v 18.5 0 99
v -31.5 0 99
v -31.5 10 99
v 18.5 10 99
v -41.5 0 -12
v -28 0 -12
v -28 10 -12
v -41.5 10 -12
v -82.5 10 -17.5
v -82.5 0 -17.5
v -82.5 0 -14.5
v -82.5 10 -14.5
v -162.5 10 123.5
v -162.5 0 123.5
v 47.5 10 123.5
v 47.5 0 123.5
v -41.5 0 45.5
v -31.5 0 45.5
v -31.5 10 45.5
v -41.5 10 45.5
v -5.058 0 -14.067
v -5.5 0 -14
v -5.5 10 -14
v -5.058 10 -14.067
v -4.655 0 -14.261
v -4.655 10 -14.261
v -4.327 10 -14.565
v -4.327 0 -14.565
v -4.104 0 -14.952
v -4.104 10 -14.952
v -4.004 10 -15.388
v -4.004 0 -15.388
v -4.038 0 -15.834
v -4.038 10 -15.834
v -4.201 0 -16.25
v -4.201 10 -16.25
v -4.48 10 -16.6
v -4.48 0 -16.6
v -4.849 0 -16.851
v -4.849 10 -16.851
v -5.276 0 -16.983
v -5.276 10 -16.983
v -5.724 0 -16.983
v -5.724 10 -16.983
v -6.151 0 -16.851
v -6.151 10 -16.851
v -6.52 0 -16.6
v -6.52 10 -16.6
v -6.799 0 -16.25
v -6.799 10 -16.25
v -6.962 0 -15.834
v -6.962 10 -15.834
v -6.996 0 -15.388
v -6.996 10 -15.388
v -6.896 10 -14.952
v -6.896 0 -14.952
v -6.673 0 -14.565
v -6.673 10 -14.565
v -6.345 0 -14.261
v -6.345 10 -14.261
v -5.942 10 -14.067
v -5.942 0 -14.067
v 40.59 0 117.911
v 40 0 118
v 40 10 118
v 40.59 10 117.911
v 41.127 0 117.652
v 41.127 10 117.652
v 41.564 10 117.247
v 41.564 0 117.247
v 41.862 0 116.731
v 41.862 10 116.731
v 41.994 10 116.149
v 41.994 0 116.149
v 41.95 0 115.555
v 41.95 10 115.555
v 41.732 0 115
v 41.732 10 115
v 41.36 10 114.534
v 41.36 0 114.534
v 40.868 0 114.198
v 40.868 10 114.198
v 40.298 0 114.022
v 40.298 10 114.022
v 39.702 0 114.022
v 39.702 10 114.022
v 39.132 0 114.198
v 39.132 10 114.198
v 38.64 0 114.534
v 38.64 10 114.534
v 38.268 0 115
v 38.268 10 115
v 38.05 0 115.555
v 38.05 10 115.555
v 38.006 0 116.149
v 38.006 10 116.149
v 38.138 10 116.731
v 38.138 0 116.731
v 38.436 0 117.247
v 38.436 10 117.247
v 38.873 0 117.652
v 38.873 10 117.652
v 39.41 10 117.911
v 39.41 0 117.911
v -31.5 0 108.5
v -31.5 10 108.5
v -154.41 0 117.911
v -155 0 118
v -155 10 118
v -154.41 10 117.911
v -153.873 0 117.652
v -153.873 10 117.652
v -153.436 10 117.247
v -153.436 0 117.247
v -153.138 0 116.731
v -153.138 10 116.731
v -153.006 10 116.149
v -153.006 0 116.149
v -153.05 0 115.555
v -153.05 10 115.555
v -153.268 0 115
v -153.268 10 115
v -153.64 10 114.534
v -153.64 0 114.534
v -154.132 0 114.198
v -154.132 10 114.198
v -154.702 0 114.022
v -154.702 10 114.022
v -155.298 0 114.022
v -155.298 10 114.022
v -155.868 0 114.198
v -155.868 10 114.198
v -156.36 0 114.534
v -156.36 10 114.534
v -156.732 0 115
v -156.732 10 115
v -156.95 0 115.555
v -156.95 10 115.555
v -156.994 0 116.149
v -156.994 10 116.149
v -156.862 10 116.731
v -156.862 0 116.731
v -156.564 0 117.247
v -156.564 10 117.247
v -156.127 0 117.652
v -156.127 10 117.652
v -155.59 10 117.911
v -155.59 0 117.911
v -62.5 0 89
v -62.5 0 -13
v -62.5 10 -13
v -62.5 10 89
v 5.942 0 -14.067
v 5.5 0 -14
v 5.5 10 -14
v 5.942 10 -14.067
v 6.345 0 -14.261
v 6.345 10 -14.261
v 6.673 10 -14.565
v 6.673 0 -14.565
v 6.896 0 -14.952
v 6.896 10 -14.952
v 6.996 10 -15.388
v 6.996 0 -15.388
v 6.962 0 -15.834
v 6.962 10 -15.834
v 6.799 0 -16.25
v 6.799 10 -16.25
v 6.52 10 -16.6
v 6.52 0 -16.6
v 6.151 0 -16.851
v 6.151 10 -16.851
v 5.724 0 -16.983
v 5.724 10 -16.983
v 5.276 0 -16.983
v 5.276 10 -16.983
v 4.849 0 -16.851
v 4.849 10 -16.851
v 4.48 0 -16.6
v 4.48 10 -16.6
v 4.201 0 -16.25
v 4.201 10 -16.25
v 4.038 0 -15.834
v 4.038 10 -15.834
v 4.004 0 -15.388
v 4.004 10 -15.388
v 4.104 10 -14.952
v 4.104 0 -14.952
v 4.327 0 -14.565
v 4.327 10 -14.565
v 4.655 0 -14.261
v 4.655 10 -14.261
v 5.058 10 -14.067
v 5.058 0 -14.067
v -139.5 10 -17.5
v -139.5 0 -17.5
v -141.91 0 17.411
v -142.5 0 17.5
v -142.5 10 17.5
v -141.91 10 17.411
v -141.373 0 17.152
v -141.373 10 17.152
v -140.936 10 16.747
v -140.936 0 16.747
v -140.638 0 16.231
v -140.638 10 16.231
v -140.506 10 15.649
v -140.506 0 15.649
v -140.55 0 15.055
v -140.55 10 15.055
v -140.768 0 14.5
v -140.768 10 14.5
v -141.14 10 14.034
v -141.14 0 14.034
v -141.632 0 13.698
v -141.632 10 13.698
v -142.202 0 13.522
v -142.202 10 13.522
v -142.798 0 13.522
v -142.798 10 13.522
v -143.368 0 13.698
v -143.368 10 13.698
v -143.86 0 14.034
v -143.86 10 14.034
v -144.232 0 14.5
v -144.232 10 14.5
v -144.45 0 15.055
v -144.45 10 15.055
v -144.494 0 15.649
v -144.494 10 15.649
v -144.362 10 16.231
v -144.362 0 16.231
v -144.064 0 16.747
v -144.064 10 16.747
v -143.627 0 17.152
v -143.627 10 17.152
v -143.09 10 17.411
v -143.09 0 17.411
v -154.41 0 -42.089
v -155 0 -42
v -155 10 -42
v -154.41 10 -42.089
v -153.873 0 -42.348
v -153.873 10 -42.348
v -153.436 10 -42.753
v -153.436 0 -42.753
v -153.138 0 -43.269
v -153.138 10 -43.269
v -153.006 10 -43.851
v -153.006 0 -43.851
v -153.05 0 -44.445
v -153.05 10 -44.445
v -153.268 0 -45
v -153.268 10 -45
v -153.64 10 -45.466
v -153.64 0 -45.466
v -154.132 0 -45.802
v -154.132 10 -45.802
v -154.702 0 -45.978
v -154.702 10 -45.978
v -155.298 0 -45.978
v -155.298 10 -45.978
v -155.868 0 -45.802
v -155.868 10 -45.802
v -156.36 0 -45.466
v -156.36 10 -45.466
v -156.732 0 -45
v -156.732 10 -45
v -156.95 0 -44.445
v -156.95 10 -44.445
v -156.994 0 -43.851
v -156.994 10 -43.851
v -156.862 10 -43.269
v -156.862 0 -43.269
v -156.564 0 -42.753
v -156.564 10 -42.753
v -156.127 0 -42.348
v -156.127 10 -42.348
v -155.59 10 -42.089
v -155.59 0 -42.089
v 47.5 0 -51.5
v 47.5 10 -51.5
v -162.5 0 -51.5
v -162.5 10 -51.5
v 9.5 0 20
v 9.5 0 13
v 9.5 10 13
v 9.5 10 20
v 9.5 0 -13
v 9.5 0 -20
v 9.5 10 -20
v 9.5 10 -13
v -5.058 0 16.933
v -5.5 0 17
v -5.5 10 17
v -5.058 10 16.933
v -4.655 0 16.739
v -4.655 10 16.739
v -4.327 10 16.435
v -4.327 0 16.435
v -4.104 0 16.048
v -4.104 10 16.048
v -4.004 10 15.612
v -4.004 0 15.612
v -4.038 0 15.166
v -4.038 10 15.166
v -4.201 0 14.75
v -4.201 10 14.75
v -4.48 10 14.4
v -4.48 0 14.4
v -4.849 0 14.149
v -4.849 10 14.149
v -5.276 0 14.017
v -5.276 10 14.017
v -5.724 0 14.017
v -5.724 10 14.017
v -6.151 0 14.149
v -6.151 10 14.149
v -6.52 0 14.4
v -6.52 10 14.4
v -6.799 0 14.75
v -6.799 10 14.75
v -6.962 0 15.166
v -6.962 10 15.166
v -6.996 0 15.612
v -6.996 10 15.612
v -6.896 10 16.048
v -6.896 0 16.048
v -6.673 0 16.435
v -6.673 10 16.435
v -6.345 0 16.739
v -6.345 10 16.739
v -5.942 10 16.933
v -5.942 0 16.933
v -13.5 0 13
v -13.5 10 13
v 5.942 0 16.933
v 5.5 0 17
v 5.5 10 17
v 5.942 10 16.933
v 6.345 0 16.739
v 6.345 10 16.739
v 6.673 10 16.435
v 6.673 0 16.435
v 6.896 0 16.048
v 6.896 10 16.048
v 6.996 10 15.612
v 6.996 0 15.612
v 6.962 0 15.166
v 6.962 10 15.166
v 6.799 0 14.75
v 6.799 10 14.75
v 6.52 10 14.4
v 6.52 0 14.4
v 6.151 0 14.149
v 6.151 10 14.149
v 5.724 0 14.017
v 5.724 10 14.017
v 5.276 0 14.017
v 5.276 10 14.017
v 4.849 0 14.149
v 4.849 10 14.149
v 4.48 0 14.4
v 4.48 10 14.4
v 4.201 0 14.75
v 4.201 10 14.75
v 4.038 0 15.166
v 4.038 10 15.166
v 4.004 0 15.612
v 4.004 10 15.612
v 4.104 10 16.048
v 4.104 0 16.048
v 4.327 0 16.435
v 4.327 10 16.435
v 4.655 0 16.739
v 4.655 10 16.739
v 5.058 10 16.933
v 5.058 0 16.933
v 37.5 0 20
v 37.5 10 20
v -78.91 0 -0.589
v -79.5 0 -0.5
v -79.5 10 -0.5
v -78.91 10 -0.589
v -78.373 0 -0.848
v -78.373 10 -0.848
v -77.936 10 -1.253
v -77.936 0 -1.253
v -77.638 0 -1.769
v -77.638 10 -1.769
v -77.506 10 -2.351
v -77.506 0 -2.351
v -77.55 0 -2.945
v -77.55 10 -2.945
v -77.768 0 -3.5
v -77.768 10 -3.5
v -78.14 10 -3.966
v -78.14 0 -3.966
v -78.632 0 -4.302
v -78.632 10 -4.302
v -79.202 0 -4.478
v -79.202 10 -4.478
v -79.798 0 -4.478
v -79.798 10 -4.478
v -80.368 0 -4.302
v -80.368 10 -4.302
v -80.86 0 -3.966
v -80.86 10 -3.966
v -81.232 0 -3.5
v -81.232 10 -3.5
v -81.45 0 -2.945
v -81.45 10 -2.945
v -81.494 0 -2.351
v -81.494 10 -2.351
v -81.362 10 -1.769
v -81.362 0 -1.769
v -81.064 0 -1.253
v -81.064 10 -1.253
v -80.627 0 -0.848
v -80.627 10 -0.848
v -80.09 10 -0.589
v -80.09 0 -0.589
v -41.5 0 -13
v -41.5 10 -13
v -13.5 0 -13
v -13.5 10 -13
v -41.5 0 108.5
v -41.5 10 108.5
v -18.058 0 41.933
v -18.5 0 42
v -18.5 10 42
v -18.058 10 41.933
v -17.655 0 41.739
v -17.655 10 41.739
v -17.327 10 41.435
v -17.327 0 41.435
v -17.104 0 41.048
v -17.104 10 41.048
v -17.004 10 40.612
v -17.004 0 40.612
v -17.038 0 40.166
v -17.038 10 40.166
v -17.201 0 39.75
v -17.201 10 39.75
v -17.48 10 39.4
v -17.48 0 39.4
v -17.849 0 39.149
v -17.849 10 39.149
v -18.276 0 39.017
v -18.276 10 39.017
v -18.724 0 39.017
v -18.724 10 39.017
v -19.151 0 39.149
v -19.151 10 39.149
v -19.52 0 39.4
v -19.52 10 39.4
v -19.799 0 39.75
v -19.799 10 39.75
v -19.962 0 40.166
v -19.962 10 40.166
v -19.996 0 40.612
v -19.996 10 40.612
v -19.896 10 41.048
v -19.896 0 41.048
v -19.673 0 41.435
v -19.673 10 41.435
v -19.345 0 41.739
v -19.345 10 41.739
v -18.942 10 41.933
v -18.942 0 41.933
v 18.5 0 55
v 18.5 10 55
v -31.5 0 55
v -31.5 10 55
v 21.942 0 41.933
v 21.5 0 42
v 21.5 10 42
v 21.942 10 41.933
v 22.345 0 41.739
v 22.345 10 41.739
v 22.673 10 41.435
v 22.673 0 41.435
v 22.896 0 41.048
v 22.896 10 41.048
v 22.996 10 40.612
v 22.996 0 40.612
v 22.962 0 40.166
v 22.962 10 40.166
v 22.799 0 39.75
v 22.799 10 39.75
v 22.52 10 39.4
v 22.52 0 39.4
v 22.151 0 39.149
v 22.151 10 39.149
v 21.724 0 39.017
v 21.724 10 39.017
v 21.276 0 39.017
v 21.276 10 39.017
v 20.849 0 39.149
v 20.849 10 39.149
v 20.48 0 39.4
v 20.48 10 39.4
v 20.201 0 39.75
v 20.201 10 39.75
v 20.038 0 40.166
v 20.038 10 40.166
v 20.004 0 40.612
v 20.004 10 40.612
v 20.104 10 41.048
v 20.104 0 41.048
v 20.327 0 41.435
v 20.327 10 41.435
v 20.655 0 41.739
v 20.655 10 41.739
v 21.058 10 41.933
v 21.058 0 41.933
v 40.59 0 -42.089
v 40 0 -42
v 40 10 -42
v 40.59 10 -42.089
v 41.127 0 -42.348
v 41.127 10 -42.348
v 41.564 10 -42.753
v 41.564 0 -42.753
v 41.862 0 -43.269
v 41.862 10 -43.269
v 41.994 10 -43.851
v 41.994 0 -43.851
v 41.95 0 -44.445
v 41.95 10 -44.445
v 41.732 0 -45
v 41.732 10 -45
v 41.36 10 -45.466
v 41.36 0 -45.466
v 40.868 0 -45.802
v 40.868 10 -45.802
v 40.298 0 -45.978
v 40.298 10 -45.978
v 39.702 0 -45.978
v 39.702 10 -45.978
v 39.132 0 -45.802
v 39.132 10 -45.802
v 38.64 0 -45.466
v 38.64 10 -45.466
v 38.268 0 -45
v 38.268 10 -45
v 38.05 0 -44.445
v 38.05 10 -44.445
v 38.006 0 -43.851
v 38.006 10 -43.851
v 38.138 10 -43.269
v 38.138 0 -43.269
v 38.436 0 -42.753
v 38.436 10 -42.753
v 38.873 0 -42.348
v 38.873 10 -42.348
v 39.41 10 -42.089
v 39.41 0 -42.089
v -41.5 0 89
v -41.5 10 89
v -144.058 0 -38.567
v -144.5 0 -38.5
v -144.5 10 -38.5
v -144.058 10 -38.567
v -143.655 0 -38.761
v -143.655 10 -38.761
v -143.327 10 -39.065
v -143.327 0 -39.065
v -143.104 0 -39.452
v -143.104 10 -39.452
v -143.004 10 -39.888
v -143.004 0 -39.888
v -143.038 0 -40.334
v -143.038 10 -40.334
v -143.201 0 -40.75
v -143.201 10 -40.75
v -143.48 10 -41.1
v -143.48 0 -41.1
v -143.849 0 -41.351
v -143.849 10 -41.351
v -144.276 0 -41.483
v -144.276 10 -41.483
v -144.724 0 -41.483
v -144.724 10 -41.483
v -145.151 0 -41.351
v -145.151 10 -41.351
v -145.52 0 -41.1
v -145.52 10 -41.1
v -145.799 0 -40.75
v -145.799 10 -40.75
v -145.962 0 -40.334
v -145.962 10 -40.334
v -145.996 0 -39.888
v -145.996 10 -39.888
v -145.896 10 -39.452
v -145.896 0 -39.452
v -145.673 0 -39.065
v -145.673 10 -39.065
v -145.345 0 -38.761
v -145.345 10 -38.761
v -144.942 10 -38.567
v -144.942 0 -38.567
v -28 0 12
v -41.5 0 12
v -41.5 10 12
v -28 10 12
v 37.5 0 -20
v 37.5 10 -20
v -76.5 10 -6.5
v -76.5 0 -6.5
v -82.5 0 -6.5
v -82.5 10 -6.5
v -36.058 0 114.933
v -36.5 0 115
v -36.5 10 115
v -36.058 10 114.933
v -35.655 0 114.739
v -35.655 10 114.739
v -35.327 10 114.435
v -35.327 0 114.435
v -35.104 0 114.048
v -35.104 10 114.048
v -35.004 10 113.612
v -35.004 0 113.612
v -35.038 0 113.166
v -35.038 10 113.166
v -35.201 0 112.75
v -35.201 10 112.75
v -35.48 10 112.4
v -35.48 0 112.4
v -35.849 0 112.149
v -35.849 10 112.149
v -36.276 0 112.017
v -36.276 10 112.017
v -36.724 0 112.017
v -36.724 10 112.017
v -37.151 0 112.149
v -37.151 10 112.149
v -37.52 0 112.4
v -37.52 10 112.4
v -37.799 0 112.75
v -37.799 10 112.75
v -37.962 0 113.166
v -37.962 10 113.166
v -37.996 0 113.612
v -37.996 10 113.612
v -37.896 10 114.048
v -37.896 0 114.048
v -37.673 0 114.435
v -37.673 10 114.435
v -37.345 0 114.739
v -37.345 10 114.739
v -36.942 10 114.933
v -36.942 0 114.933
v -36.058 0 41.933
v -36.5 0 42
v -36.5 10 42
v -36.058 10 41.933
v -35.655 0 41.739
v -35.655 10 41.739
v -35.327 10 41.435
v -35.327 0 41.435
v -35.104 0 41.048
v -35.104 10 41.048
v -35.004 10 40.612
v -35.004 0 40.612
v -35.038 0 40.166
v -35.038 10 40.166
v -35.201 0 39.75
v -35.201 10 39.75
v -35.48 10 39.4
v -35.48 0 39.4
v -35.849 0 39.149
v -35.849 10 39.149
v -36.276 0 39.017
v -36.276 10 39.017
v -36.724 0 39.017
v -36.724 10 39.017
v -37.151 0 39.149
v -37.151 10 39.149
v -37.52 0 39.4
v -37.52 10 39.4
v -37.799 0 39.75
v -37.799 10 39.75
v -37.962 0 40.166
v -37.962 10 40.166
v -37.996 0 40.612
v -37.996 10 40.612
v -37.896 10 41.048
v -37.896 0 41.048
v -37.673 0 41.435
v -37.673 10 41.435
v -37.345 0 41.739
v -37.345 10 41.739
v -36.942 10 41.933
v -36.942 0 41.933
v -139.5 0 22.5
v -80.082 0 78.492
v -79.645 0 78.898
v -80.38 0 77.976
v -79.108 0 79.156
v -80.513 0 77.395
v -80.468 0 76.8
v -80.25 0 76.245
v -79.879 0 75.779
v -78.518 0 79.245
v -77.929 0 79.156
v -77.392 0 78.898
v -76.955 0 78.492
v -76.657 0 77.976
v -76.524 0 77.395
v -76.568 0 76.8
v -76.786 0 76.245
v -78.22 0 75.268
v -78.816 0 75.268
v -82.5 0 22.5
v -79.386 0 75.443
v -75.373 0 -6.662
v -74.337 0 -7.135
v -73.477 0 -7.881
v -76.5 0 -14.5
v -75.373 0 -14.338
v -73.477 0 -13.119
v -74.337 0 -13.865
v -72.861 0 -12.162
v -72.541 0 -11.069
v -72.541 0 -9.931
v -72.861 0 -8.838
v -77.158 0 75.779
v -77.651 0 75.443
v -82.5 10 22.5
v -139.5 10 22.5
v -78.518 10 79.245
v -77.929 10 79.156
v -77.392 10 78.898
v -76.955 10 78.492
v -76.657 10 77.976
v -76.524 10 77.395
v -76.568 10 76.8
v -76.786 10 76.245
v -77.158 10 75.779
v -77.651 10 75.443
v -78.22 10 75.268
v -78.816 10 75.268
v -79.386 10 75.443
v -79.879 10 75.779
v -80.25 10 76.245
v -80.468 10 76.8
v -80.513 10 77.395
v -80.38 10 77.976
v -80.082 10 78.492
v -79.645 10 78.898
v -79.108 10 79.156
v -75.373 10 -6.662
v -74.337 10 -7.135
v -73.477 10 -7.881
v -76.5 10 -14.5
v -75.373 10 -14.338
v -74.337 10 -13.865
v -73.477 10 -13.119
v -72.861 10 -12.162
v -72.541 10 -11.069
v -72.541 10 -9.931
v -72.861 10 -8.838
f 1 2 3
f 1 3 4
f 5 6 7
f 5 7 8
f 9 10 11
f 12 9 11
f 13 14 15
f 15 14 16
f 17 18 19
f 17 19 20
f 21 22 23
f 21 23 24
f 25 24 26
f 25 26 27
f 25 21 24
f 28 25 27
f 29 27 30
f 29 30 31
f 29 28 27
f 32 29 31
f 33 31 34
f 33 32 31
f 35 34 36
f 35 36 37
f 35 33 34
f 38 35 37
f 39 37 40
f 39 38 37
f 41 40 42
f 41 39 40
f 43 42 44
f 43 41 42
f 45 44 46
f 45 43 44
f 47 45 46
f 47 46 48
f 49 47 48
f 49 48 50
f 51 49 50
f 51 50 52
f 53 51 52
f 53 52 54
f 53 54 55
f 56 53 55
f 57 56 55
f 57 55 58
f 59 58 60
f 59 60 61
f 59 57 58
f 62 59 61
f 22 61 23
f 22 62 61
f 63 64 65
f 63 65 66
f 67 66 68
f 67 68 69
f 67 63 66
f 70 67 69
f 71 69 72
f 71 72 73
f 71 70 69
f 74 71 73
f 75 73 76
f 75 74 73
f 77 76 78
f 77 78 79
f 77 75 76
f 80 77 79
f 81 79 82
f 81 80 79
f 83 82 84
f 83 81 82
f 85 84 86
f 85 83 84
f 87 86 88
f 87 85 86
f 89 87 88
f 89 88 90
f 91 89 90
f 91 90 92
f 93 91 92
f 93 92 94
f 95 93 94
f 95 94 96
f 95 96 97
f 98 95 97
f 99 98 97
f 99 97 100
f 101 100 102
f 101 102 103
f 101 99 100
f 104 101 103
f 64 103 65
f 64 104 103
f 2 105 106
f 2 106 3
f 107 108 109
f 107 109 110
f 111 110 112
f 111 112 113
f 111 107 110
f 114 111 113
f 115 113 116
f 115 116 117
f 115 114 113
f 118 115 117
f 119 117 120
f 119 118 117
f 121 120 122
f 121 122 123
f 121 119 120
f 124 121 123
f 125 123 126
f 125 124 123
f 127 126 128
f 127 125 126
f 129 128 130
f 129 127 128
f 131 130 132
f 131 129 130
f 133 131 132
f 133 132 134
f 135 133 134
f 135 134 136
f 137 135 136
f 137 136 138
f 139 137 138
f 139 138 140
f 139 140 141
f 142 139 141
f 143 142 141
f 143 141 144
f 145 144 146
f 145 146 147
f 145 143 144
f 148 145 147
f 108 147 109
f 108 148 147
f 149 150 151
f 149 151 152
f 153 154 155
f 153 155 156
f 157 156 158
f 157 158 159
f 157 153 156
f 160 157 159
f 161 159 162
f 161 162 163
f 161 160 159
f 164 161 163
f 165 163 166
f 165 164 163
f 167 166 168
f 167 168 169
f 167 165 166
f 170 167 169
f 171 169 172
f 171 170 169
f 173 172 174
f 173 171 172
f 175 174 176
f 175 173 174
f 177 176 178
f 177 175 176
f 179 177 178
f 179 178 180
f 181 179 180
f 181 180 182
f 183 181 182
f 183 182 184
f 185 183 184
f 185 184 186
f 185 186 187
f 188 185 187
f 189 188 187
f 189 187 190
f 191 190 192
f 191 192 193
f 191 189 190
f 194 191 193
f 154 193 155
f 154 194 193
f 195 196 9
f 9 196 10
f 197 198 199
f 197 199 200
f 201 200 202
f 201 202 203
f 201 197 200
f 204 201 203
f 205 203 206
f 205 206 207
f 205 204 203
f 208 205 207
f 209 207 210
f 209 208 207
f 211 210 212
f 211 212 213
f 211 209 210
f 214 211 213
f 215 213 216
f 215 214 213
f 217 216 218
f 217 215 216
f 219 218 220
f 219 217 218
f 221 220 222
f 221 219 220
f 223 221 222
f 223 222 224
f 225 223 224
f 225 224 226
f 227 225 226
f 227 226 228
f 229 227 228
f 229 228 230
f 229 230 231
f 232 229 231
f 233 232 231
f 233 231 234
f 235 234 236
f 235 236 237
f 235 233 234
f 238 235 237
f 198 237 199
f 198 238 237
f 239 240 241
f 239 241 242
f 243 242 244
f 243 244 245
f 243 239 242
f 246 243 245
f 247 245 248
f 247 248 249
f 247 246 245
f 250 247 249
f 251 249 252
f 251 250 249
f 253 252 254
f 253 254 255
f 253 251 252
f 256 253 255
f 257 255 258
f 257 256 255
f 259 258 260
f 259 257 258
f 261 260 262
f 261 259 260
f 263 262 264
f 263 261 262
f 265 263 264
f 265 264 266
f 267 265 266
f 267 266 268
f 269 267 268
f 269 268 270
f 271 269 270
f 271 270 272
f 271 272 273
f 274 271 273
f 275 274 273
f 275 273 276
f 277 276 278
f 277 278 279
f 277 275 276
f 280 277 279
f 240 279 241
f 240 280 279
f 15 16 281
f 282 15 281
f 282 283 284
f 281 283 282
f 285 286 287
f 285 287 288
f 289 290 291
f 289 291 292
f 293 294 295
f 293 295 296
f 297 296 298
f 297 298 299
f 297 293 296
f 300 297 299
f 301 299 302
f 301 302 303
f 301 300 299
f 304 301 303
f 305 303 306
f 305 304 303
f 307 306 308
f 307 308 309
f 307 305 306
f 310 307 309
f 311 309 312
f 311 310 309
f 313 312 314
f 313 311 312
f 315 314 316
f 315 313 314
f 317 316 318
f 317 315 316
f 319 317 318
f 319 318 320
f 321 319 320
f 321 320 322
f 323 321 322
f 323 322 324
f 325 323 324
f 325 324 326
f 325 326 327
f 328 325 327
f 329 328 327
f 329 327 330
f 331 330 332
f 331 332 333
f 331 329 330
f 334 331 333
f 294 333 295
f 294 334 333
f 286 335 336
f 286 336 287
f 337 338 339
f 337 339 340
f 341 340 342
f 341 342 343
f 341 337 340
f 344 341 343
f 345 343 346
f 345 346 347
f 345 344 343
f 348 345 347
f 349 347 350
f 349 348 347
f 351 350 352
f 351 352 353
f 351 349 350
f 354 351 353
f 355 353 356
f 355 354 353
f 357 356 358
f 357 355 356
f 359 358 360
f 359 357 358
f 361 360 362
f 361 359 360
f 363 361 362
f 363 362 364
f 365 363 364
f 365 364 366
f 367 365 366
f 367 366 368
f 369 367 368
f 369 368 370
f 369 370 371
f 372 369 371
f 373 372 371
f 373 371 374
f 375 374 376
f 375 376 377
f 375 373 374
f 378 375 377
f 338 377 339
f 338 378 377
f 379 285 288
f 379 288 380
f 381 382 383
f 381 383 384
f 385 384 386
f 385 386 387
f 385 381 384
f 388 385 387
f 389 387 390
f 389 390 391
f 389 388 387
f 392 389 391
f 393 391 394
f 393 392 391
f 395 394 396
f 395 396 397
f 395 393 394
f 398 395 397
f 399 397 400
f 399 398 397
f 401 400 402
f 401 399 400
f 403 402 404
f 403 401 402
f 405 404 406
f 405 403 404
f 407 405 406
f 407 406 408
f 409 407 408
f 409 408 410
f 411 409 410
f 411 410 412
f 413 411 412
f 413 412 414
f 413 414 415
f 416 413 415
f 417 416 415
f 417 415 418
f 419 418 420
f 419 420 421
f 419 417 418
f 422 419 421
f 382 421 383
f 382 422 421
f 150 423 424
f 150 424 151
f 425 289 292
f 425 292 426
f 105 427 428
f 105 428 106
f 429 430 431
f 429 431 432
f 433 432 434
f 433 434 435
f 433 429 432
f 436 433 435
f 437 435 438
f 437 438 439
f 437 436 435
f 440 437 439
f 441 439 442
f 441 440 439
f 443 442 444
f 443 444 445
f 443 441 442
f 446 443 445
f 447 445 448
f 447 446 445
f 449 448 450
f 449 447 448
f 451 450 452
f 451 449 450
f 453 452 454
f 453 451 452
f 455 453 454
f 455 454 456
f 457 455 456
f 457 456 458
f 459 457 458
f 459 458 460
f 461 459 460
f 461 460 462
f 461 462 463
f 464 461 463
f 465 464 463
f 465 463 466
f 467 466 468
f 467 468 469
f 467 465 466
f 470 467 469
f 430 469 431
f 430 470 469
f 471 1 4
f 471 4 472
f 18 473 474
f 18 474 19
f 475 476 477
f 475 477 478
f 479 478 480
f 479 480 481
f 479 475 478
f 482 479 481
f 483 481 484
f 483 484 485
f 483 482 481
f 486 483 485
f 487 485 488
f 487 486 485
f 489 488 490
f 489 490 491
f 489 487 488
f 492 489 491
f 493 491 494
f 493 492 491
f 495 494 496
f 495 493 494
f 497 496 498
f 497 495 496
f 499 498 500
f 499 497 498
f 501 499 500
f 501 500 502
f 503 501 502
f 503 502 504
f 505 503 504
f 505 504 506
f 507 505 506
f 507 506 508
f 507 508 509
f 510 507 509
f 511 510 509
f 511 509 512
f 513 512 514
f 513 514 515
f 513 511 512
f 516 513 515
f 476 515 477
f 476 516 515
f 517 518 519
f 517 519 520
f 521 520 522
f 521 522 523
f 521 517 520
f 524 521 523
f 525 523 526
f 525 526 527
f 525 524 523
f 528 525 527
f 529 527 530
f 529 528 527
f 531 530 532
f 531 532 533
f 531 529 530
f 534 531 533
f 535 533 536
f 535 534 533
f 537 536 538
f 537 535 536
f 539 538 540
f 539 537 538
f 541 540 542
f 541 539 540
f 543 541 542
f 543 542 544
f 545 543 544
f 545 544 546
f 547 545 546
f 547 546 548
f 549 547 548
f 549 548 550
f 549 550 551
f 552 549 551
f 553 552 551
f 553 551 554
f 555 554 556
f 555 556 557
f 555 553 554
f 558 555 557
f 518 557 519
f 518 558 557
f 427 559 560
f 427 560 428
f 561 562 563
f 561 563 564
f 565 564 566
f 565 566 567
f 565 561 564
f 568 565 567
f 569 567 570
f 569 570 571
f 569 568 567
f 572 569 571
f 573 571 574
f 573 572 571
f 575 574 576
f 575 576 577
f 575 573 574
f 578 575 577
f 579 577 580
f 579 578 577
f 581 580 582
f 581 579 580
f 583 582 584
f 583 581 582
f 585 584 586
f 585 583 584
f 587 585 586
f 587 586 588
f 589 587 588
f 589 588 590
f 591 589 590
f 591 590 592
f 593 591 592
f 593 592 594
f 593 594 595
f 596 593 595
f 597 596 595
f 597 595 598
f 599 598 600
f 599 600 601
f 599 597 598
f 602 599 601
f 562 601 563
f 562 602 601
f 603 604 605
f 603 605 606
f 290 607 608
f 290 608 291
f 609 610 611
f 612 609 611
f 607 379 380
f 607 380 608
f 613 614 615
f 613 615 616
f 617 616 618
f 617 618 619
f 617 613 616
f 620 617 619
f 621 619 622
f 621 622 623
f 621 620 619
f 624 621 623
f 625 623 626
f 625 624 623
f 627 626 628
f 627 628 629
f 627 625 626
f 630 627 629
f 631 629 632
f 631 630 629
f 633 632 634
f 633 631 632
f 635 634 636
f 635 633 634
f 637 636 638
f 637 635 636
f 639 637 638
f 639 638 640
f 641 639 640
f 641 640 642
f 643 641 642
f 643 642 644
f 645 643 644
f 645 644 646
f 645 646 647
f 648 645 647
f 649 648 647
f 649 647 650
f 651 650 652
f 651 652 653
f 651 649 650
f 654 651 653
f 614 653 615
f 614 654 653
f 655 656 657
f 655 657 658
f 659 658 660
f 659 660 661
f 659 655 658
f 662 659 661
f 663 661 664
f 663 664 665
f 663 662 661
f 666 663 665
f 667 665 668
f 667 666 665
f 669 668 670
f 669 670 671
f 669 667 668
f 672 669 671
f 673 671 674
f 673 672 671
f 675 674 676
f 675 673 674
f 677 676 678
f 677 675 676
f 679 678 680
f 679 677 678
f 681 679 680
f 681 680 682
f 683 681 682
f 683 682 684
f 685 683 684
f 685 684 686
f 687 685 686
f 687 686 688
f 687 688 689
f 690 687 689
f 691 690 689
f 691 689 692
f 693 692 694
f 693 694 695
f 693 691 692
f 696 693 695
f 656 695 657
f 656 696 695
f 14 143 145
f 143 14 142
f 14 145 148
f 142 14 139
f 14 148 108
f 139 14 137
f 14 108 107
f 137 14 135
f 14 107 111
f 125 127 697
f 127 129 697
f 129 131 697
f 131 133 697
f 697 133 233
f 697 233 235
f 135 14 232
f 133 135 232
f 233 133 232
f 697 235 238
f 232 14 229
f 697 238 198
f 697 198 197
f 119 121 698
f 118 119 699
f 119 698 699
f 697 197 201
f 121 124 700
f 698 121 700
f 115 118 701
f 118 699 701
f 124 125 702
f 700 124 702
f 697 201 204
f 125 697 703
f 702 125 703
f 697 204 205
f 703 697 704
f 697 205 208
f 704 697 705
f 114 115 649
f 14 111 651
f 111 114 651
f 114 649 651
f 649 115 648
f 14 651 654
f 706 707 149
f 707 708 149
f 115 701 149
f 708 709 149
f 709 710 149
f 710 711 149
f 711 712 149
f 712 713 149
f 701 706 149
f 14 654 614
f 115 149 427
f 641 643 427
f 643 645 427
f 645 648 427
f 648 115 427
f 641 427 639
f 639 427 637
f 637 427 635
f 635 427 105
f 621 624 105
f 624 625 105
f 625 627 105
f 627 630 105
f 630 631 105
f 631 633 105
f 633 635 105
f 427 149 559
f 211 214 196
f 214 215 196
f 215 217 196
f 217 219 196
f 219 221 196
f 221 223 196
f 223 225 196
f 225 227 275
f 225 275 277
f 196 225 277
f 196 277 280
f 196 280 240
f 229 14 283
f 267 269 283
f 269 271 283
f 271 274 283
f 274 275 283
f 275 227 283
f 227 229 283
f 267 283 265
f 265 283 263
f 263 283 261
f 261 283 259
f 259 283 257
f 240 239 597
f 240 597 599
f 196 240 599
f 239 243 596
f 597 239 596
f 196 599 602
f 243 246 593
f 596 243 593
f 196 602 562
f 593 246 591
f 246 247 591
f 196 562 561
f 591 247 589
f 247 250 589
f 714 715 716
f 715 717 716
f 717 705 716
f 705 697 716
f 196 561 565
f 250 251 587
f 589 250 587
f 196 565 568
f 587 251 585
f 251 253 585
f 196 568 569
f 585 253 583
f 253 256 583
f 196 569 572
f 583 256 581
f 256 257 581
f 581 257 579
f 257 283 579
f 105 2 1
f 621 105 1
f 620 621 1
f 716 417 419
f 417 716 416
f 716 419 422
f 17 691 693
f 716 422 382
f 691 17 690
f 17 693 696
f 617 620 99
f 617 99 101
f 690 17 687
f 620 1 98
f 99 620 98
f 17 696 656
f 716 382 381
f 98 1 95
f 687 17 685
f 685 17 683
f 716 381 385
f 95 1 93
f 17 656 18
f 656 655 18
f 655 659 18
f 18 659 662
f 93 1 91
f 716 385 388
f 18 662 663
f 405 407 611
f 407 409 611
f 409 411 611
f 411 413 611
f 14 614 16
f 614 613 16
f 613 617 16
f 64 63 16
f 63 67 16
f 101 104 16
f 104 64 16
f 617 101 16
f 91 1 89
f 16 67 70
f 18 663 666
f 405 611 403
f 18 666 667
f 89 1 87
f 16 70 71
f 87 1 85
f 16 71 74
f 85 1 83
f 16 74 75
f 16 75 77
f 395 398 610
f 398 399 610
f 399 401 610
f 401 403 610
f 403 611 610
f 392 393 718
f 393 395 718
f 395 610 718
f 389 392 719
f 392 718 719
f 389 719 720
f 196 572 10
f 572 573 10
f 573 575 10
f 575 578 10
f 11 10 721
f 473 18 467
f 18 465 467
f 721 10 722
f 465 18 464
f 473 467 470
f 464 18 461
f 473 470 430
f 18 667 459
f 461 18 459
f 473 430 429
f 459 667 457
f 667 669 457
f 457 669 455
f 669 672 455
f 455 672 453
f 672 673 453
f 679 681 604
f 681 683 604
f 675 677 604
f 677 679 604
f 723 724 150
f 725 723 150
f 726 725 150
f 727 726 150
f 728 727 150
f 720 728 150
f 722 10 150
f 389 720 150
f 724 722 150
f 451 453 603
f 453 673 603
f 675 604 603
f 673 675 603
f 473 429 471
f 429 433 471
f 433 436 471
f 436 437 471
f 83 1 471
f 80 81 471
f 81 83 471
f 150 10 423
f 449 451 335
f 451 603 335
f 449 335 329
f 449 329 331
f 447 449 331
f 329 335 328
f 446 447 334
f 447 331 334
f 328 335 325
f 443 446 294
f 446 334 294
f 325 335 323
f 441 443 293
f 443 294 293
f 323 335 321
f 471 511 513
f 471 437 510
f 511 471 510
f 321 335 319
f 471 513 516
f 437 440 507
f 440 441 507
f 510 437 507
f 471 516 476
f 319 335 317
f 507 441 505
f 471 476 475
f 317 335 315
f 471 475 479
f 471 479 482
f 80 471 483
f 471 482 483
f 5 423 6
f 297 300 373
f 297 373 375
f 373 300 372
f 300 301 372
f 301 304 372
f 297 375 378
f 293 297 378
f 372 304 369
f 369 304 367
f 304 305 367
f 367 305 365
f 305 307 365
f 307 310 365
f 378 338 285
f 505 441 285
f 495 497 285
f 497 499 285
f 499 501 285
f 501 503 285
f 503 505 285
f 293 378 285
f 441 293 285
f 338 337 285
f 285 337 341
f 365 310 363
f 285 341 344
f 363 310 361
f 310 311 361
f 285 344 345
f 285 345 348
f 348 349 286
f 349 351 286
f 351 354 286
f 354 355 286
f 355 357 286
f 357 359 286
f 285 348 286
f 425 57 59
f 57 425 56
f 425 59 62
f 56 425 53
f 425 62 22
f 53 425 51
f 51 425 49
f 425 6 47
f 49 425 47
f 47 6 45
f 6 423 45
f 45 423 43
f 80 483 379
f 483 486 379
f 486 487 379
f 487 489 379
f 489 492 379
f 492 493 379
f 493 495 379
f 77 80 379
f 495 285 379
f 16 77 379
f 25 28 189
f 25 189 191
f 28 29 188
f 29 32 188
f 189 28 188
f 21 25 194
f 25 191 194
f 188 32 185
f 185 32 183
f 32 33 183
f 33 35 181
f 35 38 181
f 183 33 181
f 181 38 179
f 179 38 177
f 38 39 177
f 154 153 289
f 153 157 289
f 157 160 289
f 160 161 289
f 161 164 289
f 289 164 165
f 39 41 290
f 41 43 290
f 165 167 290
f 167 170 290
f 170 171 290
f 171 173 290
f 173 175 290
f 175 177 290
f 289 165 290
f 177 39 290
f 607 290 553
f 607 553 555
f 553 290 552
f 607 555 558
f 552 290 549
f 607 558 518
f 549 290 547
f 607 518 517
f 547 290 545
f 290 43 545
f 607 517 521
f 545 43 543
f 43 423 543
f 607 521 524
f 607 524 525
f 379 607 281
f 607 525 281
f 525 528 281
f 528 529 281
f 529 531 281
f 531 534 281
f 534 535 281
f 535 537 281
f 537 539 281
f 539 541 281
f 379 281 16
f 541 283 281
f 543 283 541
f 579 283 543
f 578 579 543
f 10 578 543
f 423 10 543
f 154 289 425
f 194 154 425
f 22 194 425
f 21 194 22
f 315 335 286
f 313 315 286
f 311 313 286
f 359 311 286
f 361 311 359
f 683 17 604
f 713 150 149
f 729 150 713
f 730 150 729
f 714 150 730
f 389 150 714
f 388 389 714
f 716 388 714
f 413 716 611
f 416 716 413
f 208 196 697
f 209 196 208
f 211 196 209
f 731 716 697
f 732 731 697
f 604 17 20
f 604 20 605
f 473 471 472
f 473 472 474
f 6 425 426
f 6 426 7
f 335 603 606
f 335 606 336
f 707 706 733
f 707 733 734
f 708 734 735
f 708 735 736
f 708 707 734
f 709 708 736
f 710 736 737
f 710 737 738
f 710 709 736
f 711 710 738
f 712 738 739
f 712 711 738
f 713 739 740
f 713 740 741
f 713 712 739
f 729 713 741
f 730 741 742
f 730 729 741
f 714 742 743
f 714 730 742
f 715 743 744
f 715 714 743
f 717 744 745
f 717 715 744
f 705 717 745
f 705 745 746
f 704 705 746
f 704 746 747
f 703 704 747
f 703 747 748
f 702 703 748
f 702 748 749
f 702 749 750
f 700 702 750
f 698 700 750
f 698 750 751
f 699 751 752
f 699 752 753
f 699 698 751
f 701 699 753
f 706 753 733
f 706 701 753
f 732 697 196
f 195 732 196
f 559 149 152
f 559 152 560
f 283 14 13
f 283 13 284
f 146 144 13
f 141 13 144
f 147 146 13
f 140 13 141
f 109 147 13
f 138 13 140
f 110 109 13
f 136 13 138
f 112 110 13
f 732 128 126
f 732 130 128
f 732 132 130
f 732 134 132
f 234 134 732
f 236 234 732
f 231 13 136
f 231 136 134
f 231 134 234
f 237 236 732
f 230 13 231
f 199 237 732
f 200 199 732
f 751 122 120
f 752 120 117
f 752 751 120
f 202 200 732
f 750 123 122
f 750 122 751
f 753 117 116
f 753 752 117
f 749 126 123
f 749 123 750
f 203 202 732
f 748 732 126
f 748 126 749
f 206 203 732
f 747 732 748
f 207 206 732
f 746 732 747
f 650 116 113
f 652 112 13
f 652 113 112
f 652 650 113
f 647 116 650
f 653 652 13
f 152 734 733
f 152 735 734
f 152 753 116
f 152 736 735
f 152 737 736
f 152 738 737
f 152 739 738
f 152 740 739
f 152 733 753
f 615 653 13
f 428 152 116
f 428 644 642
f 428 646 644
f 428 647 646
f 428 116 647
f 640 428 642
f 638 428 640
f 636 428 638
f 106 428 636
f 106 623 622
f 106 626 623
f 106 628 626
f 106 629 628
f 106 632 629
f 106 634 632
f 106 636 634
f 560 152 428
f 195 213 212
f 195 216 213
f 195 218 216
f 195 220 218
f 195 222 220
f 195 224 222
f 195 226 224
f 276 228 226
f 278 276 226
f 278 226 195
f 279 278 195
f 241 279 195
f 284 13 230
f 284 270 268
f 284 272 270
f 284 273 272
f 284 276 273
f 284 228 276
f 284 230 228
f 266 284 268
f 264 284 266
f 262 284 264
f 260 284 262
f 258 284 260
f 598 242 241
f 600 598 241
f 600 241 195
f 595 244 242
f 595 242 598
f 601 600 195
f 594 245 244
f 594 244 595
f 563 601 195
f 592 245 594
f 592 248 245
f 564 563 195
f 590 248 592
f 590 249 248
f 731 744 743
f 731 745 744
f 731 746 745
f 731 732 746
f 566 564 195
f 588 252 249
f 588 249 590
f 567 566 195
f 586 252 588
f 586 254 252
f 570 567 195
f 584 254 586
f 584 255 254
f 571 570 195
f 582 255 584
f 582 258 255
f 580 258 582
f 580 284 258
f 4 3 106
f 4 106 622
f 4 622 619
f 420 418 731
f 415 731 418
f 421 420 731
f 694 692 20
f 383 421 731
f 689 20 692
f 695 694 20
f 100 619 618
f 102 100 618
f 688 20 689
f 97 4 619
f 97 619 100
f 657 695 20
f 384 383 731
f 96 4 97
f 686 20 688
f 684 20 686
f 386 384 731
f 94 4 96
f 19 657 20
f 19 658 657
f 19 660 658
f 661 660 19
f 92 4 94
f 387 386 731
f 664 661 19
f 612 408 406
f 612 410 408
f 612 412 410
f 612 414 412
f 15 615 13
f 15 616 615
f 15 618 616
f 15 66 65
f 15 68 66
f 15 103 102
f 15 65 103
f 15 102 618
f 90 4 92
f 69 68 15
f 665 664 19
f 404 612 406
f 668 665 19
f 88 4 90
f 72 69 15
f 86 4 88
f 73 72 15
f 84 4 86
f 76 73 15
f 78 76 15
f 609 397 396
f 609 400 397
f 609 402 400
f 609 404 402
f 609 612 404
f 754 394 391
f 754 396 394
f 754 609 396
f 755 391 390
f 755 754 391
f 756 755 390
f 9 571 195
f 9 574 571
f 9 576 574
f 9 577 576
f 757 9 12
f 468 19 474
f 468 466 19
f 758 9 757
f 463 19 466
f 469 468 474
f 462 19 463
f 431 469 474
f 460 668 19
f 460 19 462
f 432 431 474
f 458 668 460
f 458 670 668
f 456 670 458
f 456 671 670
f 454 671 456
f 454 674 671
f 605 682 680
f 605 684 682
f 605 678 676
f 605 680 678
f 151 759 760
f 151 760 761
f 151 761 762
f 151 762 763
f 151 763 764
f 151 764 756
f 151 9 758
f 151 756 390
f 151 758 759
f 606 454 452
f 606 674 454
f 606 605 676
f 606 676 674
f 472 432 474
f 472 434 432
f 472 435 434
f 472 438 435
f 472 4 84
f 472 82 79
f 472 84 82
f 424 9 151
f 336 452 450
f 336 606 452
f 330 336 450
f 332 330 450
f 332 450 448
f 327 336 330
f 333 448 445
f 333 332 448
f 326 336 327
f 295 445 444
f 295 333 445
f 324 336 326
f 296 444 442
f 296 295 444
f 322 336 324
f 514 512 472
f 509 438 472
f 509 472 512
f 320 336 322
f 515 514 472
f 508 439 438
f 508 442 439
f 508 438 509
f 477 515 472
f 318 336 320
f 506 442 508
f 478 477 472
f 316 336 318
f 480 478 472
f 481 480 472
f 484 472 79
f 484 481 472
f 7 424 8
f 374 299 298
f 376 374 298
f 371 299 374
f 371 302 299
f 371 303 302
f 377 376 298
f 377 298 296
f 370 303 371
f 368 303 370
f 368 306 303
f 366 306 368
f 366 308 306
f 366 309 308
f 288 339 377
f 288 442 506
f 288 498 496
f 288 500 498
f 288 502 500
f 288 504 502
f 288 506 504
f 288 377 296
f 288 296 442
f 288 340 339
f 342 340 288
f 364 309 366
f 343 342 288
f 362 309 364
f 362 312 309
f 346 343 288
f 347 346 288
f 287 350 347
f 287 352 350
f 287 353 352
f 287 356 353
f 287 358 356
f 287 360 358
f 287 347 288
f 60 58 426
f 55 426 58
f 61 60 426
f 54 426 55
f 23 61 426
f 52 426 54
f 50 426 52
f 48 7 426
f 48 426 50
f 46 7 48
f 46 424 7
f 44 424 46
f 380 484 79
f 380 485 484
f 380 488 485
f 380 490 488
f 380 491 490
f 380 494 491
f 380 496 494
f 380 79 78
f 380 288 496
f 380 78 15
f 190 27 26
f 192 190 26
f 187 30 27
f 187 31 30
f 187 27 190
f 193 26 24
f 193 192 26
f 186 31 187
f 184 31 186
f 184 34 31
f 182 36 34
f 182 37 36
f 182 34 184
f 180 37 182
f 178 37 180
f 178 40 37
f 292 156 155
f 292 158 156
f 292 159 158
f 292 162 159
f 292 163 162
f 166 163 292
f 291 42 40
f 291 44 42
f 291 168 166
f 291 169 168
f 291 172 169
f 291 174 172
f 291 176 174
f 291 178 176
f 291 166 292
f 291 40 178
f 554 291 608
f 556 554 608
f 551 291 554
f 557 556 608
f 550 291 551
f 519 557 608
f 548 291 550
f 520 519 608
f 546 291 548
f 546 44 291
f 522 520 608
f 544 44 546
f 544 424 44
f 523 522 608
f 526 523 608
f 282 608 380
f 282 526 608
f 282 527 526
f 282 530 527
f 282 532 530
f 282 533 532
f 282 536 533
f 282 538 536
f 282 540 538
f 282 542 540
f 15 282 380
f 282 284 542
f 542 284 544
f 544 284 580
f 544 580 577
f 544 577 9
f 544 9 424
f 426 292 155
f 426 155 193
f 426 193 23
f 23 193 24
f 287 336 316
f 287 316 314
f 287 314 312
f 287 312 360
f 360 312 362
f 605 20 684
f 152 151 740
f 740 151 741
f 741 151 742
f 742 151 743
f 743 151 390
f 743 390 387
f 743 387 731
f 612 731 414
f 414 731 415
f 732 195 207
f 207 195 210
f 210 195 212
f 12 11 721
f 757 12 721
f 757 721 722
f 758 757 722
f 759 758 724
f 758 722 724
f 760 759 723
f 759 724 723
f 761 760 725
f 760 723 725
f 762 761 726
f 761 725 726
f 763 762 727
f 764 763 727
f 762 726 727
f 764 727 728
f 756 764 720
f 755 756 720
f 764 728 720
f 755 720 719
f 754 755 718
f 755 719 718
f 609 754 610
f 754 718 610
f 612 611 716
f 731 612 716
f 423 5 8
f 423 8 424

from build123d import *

# Parameters (mm, degrees)
SKETCH_1_W      = 210
SKETCH_1_H      = 175
SKETCH_1_R      = 1.5
SKETCH_1_R_2    = 2
EXTRUDE_1_DEPTH = 10


with BuildPart() as part:
    # Эскиз1 → Бобышка-Вытянуть1 (new body)
    with BuildSketch(Plane(origin=(0, 0, 0), x_dir=(1, 0, 0), z_dir=(0, 1, 0))):
        with Locations((-57.5, -36)):
            Rectangle(SKETCH_1_W, SKETCH_1_H)
        with Locations(Location((-5.5, 15.5, 0), (0, 0, 270))):
            Circle(SKETCH_1_R, mode=Mode.SUBTRACT)
        with Locations(Location((5.5, 15.5, 0), (0, 0, 270))):
            Circle(SKETCH_1_R, mode=Mode.SUBTRACT)
        with Locations(Location((-5.5, -15.5, 0), (0, 0, 270))):
            Circle(SKETCH_1_R, mode=Mode.SUBTRACT)
        with Locations(Location((5.5, -15.5, 0), (0, 0, 270))):
            Circle(SKETCH_1_R, mode=Mode.SUBTRACT)
        with Locations(Location((-36.5, -40.5, 0), (0, 0, 270))):
            Circle(SKETCH_1_R, mode=Mode.SUBTRACT)
        with Locations(Location((-36.5, -113.5, 0), (0, 0, 270))):
            Circle(SKETCH_1_R, mode=Mode.SUBTRACT)
        with Locations(Location((-144.5, 40, 0), (0, 0, 270))):
            Circle(SKETCH_1_R, mode=Mode.SUBTRACT)
        with Locations(Location((-79.5, 2.5, 0), (0, 0, 270))):
            Circle(SKETCH_1_R_2, mode=Mode.SUBTRACT)
        with Locations(Location((-142.5, -15.5, 0), (0, 0, 270))):
            Circle(SKETCH_1_R_2, mode=Mode.SUBTRACT)
        with Locations(Location((-18.5, -40.5, 0), (0, 0, 270))):
            Circle(SKETCH_1_R, mode=Mode.SUBTRACT)
        with Locations(Location((21.5, -40.5, 0), (0, 0, 270))):
            Circle(SKETCH_1_R, mode=Mode.SUBTRACT)
        with Locations(Location((-155, 44, 0), (0, 0, 270))):
            Circle(SKETCH_1_R_2, mode=Mode.SUBTRACT)
        with Locations(Location((40, 44, 0), (0, 0, 270))):
            Circle(SKETCH_1_R_2, mode=Mode.SUBTRACT)
        with Locations(Location((40, -116, 0), (0, 0, 270))):
            Circle(SKETCH_1_R_2, mode=Mode.SUBTRACT)
        with Locations(Location((-155, -116, 0), (0, 0, 270))):
            Circle(SKETCH_1_R_2, mode=Mode.SUBTRACT)
        with Locations(Location((-78.518280062, -77.24520536, 0), (0, 0, 270))):
            Circle(SKETCH_1_R_2, mode=Mode.SUBTRACT)
        Polygon((-13.5, 13), (-28, 12), (-41.5, 12), (-41.5, 13), (-62.5, 13), (-62.5, -89), (-41.5, -89), (-41.5, -108.5), (-31.5, -108.5), (-31.5, -99), (18.5, -99), (18.5, -55), (-31.5, -55), (-31.5, -45.5), (-41.5, -45.5), (-41.5, -12), (-28, -12), (-13.5, -13), (9.5, -13), (9.5, -20), (37.5, -20), (37.5, 20), (9.5, 20), (9.5, 13), align=None, mode=Mode.SUBTRACT)
        with BuildLine():
            Line((-82.5, 17.5), (-82.5, 14.5))
            Line((-82.5, 14.5), (-76.5, 14.5))
            ThreePointArc((-76.5, 14.5), (-72.5, 10.5), (-76.5, 6.5))
            Line((-76.5, 6.5), (-82.5, 6.5))
            Line((-82.5, 6.5), (-82.5, -22.5))
            Line((-82.5, -22.5), (-139.5, -22.5))
            Line((-139.5, -22.5), (-139.5, 17.5))
            Line((-139.5, 17.5), (-82.5, 17.5))
        make_face(mode=Mode.SUBTRACT)
    extrude(amount=EXTRUDE_1_DEPTH)


solid = part.part
